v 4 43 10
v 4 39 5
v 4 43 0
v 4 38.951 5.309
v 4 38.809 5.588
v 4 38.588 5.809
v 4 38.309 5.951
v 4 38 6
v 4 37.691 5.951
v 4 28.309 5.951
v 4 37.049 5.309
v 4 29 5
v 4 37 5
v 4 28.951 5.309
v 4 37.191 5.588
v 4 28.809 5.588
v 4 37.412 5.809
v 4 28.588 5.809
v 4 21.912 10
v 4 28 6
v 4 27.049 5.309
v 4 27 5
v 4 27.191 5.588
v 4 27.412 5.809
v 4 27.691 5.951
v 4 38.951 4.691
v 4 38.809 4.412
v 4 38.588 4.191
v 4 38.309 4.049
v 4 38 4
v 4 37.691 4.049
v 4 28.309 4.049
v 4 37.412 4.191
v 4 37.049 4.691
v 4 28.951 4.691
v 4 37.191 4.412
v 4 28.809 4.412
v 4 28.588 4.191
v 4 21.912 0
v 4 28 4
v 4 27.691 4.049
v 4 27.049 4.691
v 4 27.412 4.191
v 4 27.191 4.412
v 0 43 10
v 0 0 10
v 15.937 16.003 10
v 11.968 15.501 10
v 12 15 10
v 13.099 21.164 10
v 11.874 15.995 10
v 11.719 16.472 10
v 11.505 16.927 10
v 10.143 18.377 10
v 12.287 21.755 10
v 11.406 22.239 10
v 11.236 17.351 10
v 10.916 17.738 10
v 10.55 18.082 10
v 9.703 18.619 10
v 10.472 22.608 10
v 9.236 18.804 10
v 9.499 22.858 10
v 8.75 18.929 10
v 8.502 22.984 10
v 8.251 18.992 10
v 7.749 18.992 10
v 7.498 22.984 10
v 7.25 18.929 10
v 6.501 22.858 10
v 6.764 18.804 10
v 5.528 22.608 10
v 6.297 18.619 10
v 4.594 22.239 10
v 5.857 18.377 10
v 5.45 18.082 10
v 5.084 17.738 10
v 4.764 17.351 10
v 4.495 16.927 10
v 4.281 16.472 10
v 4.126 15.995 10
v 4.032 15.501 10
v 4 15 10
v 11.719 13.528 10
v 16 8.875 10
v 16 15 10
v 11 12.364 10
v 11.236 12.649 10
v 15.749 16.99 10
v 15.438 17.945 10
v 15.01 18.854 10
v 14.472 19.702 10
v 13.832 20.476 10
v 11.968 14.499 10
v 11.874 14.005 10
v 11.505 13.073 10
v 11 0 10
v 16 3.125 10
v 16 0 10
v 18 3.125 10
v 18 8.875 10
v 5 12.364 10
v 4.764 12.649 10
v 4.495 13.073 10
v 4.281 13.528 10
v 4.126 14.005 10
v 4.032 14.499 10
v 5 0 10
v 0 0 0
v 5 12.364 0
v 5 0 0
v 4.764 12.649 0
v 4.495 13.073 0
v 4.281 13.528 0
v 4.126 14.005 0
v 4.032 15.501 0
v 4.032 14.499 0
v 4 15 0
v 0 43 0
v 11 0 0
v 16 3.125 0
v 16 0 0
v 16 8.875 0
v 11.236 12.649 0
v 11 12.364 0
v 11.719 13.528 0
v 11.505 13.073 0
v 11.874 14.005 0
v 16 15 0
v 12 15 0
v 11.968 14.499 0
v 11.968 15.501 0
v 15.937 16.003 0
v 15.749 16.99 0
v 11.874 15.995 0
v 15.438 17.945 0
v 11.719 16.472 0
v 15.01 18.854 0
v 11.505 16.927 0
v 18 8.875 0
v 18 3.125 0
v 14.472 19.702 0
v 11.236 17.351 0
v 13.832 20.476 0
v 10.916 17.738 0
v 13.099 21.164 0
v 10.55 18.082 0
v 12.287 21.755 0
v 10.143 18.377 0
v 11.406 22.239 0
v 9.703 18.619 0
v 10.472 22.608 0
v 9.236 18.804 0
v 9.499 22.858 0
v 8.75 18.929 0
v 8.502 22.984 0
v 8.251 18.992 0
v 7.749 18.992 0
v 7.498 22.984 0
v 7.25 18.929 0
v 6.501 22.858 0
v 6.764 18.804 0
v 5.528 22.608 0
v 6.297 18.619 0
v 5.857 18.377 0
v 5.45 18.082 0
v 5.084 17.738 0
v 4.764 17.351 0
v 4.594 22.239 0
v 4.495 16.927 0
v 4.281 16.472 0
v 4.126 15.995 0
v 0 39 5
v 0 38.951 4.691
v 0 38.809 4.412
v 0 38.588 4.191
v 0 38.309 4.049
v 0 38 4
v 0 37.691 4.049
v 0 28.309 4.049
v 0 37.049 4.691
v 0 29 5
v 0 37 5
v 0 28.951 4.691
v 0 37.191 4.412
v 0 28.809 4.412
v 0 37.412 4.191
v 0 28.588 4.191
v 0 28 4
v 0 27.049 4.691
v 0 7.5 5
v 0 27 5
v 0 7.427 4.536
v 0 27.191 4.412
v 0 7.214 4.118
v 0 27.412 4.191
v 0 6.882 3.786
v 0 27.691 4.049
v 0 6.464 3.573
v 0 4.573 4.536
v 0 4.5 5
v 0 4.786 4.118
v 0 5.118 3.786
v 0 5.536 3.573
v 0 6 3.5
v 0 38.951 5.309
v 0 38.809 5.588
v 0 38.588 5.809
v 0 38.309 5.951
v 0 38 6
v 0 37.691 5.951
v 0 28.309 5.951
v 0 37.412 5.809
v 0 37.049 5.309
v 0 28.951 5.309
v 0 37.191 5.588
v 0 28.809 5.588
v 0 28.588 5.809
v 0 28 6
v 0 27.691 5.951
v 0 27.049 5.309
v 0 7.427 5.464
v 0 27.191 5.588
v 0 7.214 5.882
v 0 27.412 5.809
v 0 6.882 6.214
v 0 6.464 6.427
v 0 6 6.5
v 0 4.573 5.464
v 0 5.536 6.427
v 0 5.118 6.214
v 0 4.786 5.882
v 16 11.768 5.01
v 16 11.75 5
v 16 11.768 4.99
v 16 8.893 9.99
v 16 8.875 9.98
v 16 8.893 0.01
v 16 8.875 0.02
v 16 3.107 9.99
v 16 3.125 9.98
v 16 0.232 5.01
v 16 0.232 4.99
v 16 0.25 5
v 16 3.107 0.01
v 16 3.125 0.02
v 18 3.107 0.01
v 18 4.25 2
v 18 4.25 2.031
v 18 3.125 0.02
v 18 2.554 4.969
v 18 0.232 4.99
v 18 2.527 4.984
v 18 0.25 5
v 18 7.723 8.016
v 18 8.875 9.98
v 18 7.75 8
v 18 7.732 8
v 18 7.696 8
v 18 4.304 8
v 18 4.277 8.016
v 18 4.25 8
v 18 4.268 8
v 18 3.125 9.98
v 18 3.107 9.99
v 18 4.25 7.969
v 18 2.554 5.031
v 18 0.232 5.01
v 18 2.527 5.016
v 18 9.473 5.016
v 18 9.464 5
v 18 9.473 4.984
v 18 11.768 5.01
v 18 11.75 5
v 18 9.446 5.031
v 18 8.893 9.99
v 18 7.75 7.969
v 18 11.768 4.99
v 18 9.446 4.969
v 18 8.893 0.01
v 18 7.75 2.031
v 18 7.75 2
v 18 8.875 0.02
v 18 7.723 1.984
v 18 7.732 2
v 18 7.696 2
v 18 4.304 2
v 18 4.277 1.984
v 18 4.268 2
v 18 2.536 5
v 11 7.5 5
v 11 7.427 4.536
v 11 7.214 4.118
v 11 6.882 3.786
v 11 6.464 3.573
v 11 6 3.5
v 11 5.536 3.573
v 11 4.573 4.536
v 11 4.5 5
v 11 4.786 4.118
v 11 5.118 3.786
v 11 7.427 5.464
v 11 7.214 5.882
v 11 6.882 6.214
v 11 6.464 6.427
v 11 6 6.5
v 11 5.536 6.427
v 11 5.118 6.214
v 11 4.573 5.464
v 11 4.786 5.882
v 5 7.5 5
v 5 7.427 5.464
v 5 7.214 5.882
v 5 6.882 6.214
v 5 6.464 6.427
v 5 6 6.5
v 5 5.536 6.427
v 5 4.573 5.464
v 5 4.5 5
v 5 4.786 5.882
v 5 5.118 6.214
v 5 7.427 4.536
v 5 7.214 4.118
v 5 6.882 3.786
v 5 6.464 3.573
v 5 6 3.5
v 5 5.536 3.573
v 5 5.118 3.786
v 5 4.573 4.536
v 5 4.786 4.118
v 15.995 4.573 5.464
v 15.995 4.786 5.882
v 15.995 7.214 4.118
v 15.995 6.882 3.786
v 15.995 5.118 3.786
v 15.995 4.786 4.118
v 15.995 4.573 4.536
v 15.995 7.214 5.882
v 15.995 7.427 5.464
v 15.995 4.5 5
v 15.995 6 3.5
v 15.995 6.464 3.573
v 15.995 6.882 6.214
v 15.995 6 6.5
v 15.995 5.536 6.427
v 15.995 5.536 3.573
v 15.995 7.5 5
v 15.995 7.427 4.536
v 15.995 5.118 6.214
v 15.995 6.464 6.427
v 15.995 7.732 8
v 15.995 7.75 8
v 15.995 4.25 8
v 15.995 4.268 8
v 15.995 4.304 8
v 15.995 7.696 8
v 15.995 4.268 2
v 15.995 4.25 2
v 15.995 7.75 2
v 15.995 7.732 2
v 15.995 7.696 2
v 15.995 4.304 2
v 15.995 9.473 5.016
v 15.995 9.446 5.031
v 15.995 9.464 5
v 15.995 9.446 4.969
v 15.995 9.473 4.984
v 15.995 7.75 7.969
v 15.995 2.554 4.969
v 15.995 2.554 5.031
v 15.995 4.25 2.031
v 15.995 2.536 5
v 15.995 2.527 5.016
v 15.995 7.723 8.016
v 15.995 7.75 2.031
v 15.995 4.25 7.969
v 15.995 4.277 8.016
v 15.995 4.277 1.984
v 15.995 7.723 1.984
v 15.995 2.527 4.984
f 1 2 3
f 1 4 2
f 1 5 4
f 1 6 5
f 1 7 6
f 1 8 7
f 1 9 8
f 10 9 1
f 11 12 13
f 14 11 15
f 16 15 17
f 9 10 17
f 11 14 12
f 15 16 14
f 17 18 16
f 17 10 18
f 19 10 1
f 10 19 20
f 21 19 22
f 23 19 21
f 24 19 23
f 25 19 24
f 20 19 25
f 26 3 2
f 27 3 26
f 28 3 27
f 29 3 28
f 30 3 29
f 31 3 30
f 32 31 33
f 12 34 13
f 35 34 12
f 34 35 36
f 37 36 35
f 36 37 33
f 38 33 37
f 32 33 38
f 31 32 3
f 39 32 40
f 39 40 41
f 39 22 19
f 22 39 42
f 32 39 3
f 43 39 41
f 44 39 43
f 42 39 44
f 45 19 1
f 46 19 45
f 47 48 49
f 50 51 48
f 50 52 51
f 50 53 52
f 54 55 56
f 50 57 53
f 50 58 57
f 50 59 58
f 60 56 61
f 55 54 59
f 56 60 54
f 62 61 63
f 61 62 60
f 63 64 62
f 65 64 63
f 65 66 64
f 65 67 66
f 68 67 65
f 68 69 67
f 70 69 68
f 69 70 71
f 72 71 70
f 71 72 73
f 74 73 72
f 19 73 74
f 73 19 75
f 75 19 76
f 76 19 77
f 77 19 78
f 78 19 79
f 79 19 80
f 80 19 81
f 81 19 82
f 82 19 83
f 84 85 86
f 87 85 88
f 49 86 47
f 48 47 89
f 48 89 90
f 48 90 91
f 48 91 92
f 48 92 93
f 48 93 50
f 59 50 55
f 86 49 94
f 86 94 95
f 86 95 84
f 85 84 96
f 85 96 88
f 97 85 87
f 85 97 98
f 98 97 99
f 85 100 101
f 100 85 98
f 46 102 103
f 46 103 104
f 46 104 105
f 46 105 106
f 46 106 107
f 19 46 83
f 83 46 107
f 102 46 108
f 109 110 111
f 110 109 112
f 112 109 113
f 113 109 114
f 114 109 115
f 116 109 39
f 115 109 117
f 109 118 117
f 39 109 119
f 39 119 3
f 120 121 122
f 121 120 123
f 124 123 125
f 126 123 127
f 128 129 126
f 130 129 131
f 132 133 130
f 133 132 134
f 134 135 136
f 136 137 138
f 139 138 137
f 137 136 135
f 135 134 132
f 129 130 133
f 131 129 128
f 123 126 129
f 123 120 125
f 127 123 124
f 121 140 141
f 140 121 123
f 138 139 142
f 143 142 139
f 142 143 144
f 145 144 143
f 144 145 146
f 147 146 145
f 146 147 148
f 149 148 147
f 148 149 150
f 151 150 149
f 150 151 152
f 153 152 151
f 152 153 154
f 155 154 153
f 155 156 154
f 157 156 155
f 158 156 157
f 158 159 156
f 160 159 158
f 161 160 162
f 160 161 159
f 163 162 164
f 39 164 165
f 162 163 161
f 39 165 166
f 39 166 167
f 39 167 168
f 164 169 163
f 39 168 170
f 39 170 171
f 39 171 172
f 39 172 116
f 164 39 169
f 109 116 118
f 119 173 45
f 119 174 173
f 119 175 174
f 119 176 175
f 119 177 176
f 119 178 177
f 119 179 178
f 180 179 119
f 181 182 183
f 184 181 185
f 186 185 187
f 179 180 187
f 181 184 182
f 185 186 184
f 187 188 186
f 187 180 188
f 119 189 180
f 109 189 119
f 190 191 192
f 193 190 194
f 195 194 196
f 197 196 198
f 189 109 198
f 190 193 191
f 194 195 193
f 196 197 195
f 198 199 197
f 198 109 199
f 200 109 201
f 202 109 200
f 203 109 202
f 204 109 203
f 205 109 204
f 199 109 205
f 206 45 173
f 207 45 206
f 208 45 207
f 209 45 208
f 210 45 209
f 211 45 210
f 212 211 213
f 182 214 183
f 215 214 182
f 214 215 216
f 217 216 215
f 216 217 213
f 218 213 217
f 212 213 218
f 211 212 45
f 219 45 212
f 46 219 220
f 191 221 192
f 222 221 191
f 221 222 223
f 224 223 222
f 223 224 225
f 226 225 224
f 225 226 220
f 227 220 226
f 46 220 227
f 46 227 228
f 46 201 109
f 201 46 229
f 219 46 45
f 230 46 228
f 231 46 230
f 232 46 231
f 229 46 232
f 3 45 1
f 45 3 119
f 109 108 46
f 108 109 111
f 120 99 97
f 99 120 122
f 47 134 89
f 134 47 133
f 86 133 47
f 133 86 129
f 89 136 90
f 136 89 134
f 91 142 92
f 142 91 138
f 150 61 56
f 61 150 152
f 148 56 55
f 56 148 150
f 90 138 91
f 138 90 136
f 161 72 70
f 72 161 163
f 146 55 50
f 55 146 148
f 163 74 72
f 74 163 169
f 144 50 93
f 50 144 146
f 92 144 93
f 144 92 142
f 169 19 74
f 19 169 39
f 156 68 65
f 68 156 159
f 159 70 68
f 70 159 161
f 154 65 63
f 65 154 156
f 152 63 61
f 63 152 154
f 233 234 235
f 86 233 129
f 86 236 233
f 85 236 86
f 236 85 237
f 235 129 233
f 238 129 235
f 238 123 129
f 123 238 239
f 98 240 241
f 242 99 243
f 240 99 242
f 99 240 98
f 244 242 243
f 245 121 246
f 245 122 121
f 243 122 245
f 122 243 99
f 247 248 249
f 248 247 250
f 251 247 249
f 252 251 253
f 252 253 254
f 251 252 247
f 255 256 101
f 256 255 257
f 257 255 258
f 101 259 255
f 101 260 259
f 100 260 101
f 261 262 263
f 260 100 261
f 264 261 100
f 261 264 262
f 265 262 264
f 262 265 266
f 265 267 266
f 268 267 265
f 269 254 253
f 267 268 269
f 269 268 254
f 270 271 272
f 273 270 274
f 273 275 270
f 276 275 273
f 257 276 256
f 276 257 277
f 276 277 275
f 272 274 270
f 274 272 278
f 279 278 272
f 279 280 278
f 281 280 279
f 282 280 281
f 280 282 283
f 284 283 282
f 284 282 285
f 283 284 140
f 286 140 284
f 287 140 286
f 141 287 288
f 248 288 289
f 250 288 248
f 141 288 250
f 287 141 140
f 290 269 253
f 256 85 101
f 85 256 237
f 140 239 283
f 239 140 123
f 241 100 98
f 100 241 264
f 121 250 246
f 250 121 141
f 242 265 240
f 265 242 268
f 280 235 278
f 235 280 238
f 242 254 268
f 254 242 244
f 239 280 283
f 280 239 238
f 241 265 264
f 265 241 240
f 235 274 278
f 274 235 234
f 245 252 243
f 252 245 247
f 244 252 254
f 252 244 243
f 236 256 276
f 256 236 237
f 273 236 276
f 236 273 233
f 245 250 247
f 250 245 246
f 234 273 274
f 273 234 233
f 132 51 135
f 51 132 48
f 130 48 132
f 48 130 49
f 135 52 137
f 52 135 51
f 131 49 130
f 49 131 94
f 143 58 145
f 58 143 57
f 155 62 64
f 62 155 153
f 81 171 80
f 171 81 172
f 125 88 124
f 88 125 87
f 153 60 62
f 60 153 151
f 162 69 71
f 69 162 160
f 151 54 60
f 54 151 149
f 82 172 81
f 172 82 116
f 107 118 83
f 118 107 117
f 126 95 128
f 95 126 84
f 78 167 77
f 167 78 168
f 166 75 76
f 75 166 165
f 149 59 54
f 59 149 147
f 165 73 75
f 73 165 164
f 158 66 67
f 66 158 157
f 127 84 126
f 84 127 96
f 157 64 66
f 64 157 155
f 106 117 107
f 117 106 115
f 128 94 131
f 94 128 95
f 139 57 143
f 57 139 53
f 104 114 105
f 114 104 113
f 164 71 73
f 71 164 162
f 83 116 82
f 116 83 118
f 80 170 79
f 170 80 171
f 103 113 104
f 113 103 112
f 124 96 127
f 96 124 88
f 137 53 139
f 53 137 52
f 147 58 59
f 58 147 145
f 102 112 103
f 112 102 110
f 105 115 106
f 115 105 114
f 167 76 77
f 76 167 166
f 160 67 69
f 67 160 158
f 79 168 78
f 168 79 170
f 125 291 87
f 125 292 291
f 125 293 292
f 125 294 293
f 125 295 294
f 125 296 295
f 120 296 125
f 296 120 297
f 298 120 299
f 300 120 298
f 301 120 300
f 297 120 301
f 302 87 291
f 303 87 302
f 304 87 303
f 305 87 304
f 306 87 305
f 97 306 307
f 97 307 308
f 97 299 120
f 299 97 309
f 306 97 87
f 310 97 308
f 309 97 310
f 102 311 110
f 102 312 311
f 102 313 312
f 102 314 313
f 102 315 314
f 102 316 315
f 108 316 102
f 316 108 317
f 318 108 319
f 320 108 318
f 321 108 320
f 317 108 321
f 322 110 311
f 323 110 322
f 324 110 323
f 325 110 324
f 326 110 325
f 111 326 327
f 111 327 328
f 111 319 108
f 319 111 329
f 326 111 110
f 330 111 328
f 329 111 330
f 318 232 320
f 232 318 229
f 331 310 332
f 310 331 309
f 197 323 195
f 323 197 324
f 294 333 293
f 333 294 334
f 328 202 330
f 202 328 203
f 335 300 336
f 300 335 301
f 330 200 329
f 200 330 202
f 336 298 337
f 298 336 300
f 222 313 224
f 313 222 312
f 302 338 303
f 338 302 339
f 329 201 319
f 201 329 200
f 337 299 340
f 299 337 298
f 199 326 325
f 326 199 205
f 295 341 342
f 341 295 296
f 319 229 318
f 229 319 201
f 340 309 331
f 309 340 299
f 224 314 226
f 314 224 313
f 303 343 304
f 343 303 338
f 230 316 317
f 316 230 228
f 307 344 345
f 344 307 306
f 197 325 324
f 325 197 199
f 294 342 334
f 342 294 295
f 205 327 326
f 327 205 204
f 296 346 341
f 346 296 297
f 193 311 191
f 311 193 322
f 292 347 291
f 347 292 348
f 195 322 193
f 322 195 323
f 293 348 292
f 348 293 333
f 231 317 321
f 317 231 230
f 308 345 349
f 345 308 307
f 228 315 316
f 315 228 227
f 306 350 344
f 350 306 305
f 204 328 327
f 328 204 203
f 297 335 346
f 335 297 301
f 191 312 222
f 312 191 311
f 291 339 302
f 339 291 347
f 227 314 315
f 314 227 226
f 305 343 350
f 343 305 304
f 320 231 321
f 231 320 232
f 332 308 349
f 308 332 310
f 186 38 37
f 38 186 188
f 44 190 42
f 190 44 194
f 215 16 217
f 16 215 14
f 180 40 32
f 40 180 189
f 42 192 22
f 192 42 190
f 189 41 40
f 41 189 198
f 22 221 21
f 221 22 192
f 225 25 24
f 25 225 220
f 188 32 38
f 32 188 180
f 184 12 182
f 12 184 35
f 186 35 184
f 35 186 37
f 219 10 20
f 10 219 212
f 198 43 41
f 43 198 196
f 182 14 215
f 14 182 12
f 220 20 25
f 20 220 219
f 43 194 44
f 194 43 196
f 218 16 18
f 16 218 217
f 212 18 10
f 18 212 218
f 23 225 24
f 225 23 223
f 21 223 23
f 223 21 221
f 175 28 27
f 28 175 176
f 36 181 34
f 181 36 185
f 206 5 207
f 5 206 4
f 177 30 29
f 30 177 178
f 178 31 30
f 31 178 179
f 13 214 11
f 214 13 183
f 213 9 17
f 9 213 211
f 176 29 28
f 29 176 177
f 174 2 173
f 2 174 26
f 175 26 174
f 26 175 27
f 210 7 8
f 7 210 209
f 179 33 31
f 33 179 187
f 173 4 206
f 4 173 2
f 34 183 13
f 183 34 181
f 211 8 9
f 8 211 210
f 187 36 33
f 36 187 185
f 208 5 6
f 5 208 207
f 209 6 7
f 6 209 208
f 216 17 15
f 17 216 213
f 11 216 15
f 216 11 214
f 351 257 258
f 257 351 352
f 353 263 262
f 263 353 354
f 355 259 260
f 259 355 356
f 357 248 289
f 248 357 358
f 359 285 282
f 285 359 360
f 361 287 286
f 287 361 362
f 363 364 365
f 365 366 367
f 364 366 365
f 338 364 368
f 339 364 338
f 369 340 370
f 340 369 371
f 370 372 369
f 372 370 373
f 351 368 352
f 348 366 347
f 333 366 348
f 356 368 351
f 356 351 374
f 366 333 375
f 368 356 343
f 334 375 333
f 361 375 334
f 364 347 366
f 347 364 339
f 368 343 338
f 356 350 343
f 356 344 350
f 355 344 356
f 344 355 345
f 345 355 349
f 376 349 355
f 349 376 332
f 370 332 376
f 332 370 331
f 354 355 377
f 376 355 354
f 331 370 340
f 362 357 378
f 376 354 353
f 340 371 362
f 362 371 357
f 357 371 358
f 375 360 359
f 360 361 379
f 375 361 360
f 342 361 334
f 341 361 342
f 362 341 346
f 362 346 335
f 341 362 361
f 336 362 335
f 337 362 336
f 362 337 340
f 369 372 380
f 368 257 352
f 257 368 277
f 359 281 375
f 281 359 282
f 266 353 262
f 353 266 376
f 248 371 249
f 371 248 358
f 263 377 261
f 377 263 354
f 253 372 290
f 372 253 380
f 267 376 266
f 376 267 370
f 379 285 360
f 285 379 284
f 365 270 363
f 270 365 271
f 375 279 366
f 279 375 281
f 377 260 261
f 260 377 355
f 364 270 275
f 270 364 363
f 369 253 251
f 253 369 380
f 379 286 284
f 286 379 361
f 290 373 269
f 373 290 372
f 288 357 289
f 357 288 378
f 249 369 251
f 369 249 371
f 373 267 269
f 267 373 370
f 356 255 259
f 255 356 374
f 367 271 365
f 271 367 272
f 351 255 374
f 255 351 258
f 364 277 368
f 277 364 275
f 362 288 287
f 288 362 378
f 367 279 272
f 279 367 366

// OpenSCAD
// file: micro_switch.scad
include <MCAD/materials.scad>
include <MCAD/metric_fastners.scad>

module micro_switch(with_extra_parts=false, exploded=false) {
  scale([-1,1,1]) translate([-19.8, 0, 0]){
    difference() {
      color(BlackPaint) cube([19.8, 10.8, 6.4]);

      translate([5.15, 2, 0]) {
        translate([0, 0, -0.5])
          cylinder(h = 7.4, R=2.6, $fn=100);
        translate([9.5, 0, -0.5])
        cylinder(h = 7.4, R=2.6, $fn=100);
      }
    }
    translate([2.8, 10.8, 1.2])
      rotate([0,0,10])
        color(Steel) cube([17,1,4]);

    if(with_extra_parts)
      micro_switch_extras(exploded_distance=(exploded?15:0));
  }

  module micro_switch_extras(exploded_distance=0) {
    screw_size = 2.2;
    screw_length = 13;
    echo("Non-Plastic Parts, 2, Self Tapping Screw 2.2 x 13 mm for micro switch");
    translate([5.15, 2, 0]) color(Steel) {
      translate([0, 0, 0.5+6.4+exploded_distance])
        rotate([180,0,0]) csk_bolt(screw_size, screw_length);
      translate([9.5, 0, 0.5+6.4+exploded_distance])
        rotate([180,0,0]) csk_bolt(screw_size, screw_length);
    }
  }

}


micro_switch();
// main file
//Endstop Holder by NewtonrRob
//http://www.thingiverse.com/thing:30085
//http://creativecommons.org/licenses/by-sa/3.0/

include <MCAD/units.scad>
include <MCAD/materials.scad>
include <MCAD/metric_fastners.scad>
include <MCAD/nuts_and_bolts.scad>
use <micro_switch.scad>

module end_stop_holder(with_extra_parts=false, exploded=false) {
difference() {
	union() {
		cube([4,43,10]);  //4,45,10
		translate([8, 15,0]) cylinder(h = 10, r = 8, $fn = 50);
		cube([16, 15,10]);

		translate([17,6,5]) cube([2,5.75,10], center=true);
		translate([17,6,5]) rotate(a=[60,0,0]) cube([2,5.75,10], center=true);
		translate([17,6,5]) rotate(a=[120,0,0]) cube([2,5.75,10], center=true);
	}
	translate([8, 15,-epsilon]) cylinder(h = 10+2*epsilon, r = 4, $fn = 50);
	translate([5, -epsilon, -epsilon]) cube([6, 15+epsilon,10+2*epsilon]);
	translate([-10, 6, 5]) rotate(a=[0, 90, 0]) cylinder(h = 30, r = 1.5, $fn= 20);
	translate([-10, 28, 5]) rotate(a=[0, 90, 0]) cylinder(h = 30, r = 1, $fn= 20);
	translate([-10, 38, 5]) rotate(a=[0, 90, 0]) cylinder(h = 30, r = 1, $fn= 20);
	translate([17,6,5]) cube([2+epsilon,3.5,6], center=true);
	translate([17,6,5]) rotate(a=[60,0,0]) cube([2+epsilon,3.5,6], center=true);
	translate([17,6,5]) rotate(a=[120,0,0]) cube([2+epsilon,3.5,6], center=true);
}

  if(with_extra_parts) {
    end_stop_holder_extras(exploded_distance=(exploded?8:0));
  }

  module end_stop_holder_extras(exploded_distance=0) {
    echo("Non-Plastic Parts, 6, Washer M3 to attach micro switch on end_stop_holder");
    for(i = [0:2] ) {
      translate([4+i*0.3+(i+1)*0.2*exploded_distance, 28, 5]) rotate([0, 90, 0]) color(Steel) washer(3);
      translate([4+i*0.3+(i+1)*0.2*exploded_distance, 38, 5]) rotate([0, 90, 0]) color(Steel) washer(3);
    }

    echo("Non-Plastic Parts, 1, Micro Switch on end_stop_holder");
    translate([4+3*0.3+exploded_distance, 28-5.15+(10-9.5)/2, 5-2])
      rotate([90,0,90])
        micro_switch(with_extra_parts=true, exploded=(exploded_distance!=0));

    echo("Non-Plastic Parts, 1, Bolt M3 x 18 mm to attach end_stop_holder on smooth rod");
    translate([-3*exploded_distance,6,5])
      rotate([0,90,0])
        color(Steel) boltHole(size=3, length=18);

    echo("Non-Plastic Parts, 1, Nut M3 to attach end_stop_holder on smooth rod");
    translate([17+0.9*3/2+exploded_distance,6,5])
      rotate([0,-90,0])
        rotate([0,0,30]) color(Steel) flat_nut(3);
  }

}


end_stop_holder();
